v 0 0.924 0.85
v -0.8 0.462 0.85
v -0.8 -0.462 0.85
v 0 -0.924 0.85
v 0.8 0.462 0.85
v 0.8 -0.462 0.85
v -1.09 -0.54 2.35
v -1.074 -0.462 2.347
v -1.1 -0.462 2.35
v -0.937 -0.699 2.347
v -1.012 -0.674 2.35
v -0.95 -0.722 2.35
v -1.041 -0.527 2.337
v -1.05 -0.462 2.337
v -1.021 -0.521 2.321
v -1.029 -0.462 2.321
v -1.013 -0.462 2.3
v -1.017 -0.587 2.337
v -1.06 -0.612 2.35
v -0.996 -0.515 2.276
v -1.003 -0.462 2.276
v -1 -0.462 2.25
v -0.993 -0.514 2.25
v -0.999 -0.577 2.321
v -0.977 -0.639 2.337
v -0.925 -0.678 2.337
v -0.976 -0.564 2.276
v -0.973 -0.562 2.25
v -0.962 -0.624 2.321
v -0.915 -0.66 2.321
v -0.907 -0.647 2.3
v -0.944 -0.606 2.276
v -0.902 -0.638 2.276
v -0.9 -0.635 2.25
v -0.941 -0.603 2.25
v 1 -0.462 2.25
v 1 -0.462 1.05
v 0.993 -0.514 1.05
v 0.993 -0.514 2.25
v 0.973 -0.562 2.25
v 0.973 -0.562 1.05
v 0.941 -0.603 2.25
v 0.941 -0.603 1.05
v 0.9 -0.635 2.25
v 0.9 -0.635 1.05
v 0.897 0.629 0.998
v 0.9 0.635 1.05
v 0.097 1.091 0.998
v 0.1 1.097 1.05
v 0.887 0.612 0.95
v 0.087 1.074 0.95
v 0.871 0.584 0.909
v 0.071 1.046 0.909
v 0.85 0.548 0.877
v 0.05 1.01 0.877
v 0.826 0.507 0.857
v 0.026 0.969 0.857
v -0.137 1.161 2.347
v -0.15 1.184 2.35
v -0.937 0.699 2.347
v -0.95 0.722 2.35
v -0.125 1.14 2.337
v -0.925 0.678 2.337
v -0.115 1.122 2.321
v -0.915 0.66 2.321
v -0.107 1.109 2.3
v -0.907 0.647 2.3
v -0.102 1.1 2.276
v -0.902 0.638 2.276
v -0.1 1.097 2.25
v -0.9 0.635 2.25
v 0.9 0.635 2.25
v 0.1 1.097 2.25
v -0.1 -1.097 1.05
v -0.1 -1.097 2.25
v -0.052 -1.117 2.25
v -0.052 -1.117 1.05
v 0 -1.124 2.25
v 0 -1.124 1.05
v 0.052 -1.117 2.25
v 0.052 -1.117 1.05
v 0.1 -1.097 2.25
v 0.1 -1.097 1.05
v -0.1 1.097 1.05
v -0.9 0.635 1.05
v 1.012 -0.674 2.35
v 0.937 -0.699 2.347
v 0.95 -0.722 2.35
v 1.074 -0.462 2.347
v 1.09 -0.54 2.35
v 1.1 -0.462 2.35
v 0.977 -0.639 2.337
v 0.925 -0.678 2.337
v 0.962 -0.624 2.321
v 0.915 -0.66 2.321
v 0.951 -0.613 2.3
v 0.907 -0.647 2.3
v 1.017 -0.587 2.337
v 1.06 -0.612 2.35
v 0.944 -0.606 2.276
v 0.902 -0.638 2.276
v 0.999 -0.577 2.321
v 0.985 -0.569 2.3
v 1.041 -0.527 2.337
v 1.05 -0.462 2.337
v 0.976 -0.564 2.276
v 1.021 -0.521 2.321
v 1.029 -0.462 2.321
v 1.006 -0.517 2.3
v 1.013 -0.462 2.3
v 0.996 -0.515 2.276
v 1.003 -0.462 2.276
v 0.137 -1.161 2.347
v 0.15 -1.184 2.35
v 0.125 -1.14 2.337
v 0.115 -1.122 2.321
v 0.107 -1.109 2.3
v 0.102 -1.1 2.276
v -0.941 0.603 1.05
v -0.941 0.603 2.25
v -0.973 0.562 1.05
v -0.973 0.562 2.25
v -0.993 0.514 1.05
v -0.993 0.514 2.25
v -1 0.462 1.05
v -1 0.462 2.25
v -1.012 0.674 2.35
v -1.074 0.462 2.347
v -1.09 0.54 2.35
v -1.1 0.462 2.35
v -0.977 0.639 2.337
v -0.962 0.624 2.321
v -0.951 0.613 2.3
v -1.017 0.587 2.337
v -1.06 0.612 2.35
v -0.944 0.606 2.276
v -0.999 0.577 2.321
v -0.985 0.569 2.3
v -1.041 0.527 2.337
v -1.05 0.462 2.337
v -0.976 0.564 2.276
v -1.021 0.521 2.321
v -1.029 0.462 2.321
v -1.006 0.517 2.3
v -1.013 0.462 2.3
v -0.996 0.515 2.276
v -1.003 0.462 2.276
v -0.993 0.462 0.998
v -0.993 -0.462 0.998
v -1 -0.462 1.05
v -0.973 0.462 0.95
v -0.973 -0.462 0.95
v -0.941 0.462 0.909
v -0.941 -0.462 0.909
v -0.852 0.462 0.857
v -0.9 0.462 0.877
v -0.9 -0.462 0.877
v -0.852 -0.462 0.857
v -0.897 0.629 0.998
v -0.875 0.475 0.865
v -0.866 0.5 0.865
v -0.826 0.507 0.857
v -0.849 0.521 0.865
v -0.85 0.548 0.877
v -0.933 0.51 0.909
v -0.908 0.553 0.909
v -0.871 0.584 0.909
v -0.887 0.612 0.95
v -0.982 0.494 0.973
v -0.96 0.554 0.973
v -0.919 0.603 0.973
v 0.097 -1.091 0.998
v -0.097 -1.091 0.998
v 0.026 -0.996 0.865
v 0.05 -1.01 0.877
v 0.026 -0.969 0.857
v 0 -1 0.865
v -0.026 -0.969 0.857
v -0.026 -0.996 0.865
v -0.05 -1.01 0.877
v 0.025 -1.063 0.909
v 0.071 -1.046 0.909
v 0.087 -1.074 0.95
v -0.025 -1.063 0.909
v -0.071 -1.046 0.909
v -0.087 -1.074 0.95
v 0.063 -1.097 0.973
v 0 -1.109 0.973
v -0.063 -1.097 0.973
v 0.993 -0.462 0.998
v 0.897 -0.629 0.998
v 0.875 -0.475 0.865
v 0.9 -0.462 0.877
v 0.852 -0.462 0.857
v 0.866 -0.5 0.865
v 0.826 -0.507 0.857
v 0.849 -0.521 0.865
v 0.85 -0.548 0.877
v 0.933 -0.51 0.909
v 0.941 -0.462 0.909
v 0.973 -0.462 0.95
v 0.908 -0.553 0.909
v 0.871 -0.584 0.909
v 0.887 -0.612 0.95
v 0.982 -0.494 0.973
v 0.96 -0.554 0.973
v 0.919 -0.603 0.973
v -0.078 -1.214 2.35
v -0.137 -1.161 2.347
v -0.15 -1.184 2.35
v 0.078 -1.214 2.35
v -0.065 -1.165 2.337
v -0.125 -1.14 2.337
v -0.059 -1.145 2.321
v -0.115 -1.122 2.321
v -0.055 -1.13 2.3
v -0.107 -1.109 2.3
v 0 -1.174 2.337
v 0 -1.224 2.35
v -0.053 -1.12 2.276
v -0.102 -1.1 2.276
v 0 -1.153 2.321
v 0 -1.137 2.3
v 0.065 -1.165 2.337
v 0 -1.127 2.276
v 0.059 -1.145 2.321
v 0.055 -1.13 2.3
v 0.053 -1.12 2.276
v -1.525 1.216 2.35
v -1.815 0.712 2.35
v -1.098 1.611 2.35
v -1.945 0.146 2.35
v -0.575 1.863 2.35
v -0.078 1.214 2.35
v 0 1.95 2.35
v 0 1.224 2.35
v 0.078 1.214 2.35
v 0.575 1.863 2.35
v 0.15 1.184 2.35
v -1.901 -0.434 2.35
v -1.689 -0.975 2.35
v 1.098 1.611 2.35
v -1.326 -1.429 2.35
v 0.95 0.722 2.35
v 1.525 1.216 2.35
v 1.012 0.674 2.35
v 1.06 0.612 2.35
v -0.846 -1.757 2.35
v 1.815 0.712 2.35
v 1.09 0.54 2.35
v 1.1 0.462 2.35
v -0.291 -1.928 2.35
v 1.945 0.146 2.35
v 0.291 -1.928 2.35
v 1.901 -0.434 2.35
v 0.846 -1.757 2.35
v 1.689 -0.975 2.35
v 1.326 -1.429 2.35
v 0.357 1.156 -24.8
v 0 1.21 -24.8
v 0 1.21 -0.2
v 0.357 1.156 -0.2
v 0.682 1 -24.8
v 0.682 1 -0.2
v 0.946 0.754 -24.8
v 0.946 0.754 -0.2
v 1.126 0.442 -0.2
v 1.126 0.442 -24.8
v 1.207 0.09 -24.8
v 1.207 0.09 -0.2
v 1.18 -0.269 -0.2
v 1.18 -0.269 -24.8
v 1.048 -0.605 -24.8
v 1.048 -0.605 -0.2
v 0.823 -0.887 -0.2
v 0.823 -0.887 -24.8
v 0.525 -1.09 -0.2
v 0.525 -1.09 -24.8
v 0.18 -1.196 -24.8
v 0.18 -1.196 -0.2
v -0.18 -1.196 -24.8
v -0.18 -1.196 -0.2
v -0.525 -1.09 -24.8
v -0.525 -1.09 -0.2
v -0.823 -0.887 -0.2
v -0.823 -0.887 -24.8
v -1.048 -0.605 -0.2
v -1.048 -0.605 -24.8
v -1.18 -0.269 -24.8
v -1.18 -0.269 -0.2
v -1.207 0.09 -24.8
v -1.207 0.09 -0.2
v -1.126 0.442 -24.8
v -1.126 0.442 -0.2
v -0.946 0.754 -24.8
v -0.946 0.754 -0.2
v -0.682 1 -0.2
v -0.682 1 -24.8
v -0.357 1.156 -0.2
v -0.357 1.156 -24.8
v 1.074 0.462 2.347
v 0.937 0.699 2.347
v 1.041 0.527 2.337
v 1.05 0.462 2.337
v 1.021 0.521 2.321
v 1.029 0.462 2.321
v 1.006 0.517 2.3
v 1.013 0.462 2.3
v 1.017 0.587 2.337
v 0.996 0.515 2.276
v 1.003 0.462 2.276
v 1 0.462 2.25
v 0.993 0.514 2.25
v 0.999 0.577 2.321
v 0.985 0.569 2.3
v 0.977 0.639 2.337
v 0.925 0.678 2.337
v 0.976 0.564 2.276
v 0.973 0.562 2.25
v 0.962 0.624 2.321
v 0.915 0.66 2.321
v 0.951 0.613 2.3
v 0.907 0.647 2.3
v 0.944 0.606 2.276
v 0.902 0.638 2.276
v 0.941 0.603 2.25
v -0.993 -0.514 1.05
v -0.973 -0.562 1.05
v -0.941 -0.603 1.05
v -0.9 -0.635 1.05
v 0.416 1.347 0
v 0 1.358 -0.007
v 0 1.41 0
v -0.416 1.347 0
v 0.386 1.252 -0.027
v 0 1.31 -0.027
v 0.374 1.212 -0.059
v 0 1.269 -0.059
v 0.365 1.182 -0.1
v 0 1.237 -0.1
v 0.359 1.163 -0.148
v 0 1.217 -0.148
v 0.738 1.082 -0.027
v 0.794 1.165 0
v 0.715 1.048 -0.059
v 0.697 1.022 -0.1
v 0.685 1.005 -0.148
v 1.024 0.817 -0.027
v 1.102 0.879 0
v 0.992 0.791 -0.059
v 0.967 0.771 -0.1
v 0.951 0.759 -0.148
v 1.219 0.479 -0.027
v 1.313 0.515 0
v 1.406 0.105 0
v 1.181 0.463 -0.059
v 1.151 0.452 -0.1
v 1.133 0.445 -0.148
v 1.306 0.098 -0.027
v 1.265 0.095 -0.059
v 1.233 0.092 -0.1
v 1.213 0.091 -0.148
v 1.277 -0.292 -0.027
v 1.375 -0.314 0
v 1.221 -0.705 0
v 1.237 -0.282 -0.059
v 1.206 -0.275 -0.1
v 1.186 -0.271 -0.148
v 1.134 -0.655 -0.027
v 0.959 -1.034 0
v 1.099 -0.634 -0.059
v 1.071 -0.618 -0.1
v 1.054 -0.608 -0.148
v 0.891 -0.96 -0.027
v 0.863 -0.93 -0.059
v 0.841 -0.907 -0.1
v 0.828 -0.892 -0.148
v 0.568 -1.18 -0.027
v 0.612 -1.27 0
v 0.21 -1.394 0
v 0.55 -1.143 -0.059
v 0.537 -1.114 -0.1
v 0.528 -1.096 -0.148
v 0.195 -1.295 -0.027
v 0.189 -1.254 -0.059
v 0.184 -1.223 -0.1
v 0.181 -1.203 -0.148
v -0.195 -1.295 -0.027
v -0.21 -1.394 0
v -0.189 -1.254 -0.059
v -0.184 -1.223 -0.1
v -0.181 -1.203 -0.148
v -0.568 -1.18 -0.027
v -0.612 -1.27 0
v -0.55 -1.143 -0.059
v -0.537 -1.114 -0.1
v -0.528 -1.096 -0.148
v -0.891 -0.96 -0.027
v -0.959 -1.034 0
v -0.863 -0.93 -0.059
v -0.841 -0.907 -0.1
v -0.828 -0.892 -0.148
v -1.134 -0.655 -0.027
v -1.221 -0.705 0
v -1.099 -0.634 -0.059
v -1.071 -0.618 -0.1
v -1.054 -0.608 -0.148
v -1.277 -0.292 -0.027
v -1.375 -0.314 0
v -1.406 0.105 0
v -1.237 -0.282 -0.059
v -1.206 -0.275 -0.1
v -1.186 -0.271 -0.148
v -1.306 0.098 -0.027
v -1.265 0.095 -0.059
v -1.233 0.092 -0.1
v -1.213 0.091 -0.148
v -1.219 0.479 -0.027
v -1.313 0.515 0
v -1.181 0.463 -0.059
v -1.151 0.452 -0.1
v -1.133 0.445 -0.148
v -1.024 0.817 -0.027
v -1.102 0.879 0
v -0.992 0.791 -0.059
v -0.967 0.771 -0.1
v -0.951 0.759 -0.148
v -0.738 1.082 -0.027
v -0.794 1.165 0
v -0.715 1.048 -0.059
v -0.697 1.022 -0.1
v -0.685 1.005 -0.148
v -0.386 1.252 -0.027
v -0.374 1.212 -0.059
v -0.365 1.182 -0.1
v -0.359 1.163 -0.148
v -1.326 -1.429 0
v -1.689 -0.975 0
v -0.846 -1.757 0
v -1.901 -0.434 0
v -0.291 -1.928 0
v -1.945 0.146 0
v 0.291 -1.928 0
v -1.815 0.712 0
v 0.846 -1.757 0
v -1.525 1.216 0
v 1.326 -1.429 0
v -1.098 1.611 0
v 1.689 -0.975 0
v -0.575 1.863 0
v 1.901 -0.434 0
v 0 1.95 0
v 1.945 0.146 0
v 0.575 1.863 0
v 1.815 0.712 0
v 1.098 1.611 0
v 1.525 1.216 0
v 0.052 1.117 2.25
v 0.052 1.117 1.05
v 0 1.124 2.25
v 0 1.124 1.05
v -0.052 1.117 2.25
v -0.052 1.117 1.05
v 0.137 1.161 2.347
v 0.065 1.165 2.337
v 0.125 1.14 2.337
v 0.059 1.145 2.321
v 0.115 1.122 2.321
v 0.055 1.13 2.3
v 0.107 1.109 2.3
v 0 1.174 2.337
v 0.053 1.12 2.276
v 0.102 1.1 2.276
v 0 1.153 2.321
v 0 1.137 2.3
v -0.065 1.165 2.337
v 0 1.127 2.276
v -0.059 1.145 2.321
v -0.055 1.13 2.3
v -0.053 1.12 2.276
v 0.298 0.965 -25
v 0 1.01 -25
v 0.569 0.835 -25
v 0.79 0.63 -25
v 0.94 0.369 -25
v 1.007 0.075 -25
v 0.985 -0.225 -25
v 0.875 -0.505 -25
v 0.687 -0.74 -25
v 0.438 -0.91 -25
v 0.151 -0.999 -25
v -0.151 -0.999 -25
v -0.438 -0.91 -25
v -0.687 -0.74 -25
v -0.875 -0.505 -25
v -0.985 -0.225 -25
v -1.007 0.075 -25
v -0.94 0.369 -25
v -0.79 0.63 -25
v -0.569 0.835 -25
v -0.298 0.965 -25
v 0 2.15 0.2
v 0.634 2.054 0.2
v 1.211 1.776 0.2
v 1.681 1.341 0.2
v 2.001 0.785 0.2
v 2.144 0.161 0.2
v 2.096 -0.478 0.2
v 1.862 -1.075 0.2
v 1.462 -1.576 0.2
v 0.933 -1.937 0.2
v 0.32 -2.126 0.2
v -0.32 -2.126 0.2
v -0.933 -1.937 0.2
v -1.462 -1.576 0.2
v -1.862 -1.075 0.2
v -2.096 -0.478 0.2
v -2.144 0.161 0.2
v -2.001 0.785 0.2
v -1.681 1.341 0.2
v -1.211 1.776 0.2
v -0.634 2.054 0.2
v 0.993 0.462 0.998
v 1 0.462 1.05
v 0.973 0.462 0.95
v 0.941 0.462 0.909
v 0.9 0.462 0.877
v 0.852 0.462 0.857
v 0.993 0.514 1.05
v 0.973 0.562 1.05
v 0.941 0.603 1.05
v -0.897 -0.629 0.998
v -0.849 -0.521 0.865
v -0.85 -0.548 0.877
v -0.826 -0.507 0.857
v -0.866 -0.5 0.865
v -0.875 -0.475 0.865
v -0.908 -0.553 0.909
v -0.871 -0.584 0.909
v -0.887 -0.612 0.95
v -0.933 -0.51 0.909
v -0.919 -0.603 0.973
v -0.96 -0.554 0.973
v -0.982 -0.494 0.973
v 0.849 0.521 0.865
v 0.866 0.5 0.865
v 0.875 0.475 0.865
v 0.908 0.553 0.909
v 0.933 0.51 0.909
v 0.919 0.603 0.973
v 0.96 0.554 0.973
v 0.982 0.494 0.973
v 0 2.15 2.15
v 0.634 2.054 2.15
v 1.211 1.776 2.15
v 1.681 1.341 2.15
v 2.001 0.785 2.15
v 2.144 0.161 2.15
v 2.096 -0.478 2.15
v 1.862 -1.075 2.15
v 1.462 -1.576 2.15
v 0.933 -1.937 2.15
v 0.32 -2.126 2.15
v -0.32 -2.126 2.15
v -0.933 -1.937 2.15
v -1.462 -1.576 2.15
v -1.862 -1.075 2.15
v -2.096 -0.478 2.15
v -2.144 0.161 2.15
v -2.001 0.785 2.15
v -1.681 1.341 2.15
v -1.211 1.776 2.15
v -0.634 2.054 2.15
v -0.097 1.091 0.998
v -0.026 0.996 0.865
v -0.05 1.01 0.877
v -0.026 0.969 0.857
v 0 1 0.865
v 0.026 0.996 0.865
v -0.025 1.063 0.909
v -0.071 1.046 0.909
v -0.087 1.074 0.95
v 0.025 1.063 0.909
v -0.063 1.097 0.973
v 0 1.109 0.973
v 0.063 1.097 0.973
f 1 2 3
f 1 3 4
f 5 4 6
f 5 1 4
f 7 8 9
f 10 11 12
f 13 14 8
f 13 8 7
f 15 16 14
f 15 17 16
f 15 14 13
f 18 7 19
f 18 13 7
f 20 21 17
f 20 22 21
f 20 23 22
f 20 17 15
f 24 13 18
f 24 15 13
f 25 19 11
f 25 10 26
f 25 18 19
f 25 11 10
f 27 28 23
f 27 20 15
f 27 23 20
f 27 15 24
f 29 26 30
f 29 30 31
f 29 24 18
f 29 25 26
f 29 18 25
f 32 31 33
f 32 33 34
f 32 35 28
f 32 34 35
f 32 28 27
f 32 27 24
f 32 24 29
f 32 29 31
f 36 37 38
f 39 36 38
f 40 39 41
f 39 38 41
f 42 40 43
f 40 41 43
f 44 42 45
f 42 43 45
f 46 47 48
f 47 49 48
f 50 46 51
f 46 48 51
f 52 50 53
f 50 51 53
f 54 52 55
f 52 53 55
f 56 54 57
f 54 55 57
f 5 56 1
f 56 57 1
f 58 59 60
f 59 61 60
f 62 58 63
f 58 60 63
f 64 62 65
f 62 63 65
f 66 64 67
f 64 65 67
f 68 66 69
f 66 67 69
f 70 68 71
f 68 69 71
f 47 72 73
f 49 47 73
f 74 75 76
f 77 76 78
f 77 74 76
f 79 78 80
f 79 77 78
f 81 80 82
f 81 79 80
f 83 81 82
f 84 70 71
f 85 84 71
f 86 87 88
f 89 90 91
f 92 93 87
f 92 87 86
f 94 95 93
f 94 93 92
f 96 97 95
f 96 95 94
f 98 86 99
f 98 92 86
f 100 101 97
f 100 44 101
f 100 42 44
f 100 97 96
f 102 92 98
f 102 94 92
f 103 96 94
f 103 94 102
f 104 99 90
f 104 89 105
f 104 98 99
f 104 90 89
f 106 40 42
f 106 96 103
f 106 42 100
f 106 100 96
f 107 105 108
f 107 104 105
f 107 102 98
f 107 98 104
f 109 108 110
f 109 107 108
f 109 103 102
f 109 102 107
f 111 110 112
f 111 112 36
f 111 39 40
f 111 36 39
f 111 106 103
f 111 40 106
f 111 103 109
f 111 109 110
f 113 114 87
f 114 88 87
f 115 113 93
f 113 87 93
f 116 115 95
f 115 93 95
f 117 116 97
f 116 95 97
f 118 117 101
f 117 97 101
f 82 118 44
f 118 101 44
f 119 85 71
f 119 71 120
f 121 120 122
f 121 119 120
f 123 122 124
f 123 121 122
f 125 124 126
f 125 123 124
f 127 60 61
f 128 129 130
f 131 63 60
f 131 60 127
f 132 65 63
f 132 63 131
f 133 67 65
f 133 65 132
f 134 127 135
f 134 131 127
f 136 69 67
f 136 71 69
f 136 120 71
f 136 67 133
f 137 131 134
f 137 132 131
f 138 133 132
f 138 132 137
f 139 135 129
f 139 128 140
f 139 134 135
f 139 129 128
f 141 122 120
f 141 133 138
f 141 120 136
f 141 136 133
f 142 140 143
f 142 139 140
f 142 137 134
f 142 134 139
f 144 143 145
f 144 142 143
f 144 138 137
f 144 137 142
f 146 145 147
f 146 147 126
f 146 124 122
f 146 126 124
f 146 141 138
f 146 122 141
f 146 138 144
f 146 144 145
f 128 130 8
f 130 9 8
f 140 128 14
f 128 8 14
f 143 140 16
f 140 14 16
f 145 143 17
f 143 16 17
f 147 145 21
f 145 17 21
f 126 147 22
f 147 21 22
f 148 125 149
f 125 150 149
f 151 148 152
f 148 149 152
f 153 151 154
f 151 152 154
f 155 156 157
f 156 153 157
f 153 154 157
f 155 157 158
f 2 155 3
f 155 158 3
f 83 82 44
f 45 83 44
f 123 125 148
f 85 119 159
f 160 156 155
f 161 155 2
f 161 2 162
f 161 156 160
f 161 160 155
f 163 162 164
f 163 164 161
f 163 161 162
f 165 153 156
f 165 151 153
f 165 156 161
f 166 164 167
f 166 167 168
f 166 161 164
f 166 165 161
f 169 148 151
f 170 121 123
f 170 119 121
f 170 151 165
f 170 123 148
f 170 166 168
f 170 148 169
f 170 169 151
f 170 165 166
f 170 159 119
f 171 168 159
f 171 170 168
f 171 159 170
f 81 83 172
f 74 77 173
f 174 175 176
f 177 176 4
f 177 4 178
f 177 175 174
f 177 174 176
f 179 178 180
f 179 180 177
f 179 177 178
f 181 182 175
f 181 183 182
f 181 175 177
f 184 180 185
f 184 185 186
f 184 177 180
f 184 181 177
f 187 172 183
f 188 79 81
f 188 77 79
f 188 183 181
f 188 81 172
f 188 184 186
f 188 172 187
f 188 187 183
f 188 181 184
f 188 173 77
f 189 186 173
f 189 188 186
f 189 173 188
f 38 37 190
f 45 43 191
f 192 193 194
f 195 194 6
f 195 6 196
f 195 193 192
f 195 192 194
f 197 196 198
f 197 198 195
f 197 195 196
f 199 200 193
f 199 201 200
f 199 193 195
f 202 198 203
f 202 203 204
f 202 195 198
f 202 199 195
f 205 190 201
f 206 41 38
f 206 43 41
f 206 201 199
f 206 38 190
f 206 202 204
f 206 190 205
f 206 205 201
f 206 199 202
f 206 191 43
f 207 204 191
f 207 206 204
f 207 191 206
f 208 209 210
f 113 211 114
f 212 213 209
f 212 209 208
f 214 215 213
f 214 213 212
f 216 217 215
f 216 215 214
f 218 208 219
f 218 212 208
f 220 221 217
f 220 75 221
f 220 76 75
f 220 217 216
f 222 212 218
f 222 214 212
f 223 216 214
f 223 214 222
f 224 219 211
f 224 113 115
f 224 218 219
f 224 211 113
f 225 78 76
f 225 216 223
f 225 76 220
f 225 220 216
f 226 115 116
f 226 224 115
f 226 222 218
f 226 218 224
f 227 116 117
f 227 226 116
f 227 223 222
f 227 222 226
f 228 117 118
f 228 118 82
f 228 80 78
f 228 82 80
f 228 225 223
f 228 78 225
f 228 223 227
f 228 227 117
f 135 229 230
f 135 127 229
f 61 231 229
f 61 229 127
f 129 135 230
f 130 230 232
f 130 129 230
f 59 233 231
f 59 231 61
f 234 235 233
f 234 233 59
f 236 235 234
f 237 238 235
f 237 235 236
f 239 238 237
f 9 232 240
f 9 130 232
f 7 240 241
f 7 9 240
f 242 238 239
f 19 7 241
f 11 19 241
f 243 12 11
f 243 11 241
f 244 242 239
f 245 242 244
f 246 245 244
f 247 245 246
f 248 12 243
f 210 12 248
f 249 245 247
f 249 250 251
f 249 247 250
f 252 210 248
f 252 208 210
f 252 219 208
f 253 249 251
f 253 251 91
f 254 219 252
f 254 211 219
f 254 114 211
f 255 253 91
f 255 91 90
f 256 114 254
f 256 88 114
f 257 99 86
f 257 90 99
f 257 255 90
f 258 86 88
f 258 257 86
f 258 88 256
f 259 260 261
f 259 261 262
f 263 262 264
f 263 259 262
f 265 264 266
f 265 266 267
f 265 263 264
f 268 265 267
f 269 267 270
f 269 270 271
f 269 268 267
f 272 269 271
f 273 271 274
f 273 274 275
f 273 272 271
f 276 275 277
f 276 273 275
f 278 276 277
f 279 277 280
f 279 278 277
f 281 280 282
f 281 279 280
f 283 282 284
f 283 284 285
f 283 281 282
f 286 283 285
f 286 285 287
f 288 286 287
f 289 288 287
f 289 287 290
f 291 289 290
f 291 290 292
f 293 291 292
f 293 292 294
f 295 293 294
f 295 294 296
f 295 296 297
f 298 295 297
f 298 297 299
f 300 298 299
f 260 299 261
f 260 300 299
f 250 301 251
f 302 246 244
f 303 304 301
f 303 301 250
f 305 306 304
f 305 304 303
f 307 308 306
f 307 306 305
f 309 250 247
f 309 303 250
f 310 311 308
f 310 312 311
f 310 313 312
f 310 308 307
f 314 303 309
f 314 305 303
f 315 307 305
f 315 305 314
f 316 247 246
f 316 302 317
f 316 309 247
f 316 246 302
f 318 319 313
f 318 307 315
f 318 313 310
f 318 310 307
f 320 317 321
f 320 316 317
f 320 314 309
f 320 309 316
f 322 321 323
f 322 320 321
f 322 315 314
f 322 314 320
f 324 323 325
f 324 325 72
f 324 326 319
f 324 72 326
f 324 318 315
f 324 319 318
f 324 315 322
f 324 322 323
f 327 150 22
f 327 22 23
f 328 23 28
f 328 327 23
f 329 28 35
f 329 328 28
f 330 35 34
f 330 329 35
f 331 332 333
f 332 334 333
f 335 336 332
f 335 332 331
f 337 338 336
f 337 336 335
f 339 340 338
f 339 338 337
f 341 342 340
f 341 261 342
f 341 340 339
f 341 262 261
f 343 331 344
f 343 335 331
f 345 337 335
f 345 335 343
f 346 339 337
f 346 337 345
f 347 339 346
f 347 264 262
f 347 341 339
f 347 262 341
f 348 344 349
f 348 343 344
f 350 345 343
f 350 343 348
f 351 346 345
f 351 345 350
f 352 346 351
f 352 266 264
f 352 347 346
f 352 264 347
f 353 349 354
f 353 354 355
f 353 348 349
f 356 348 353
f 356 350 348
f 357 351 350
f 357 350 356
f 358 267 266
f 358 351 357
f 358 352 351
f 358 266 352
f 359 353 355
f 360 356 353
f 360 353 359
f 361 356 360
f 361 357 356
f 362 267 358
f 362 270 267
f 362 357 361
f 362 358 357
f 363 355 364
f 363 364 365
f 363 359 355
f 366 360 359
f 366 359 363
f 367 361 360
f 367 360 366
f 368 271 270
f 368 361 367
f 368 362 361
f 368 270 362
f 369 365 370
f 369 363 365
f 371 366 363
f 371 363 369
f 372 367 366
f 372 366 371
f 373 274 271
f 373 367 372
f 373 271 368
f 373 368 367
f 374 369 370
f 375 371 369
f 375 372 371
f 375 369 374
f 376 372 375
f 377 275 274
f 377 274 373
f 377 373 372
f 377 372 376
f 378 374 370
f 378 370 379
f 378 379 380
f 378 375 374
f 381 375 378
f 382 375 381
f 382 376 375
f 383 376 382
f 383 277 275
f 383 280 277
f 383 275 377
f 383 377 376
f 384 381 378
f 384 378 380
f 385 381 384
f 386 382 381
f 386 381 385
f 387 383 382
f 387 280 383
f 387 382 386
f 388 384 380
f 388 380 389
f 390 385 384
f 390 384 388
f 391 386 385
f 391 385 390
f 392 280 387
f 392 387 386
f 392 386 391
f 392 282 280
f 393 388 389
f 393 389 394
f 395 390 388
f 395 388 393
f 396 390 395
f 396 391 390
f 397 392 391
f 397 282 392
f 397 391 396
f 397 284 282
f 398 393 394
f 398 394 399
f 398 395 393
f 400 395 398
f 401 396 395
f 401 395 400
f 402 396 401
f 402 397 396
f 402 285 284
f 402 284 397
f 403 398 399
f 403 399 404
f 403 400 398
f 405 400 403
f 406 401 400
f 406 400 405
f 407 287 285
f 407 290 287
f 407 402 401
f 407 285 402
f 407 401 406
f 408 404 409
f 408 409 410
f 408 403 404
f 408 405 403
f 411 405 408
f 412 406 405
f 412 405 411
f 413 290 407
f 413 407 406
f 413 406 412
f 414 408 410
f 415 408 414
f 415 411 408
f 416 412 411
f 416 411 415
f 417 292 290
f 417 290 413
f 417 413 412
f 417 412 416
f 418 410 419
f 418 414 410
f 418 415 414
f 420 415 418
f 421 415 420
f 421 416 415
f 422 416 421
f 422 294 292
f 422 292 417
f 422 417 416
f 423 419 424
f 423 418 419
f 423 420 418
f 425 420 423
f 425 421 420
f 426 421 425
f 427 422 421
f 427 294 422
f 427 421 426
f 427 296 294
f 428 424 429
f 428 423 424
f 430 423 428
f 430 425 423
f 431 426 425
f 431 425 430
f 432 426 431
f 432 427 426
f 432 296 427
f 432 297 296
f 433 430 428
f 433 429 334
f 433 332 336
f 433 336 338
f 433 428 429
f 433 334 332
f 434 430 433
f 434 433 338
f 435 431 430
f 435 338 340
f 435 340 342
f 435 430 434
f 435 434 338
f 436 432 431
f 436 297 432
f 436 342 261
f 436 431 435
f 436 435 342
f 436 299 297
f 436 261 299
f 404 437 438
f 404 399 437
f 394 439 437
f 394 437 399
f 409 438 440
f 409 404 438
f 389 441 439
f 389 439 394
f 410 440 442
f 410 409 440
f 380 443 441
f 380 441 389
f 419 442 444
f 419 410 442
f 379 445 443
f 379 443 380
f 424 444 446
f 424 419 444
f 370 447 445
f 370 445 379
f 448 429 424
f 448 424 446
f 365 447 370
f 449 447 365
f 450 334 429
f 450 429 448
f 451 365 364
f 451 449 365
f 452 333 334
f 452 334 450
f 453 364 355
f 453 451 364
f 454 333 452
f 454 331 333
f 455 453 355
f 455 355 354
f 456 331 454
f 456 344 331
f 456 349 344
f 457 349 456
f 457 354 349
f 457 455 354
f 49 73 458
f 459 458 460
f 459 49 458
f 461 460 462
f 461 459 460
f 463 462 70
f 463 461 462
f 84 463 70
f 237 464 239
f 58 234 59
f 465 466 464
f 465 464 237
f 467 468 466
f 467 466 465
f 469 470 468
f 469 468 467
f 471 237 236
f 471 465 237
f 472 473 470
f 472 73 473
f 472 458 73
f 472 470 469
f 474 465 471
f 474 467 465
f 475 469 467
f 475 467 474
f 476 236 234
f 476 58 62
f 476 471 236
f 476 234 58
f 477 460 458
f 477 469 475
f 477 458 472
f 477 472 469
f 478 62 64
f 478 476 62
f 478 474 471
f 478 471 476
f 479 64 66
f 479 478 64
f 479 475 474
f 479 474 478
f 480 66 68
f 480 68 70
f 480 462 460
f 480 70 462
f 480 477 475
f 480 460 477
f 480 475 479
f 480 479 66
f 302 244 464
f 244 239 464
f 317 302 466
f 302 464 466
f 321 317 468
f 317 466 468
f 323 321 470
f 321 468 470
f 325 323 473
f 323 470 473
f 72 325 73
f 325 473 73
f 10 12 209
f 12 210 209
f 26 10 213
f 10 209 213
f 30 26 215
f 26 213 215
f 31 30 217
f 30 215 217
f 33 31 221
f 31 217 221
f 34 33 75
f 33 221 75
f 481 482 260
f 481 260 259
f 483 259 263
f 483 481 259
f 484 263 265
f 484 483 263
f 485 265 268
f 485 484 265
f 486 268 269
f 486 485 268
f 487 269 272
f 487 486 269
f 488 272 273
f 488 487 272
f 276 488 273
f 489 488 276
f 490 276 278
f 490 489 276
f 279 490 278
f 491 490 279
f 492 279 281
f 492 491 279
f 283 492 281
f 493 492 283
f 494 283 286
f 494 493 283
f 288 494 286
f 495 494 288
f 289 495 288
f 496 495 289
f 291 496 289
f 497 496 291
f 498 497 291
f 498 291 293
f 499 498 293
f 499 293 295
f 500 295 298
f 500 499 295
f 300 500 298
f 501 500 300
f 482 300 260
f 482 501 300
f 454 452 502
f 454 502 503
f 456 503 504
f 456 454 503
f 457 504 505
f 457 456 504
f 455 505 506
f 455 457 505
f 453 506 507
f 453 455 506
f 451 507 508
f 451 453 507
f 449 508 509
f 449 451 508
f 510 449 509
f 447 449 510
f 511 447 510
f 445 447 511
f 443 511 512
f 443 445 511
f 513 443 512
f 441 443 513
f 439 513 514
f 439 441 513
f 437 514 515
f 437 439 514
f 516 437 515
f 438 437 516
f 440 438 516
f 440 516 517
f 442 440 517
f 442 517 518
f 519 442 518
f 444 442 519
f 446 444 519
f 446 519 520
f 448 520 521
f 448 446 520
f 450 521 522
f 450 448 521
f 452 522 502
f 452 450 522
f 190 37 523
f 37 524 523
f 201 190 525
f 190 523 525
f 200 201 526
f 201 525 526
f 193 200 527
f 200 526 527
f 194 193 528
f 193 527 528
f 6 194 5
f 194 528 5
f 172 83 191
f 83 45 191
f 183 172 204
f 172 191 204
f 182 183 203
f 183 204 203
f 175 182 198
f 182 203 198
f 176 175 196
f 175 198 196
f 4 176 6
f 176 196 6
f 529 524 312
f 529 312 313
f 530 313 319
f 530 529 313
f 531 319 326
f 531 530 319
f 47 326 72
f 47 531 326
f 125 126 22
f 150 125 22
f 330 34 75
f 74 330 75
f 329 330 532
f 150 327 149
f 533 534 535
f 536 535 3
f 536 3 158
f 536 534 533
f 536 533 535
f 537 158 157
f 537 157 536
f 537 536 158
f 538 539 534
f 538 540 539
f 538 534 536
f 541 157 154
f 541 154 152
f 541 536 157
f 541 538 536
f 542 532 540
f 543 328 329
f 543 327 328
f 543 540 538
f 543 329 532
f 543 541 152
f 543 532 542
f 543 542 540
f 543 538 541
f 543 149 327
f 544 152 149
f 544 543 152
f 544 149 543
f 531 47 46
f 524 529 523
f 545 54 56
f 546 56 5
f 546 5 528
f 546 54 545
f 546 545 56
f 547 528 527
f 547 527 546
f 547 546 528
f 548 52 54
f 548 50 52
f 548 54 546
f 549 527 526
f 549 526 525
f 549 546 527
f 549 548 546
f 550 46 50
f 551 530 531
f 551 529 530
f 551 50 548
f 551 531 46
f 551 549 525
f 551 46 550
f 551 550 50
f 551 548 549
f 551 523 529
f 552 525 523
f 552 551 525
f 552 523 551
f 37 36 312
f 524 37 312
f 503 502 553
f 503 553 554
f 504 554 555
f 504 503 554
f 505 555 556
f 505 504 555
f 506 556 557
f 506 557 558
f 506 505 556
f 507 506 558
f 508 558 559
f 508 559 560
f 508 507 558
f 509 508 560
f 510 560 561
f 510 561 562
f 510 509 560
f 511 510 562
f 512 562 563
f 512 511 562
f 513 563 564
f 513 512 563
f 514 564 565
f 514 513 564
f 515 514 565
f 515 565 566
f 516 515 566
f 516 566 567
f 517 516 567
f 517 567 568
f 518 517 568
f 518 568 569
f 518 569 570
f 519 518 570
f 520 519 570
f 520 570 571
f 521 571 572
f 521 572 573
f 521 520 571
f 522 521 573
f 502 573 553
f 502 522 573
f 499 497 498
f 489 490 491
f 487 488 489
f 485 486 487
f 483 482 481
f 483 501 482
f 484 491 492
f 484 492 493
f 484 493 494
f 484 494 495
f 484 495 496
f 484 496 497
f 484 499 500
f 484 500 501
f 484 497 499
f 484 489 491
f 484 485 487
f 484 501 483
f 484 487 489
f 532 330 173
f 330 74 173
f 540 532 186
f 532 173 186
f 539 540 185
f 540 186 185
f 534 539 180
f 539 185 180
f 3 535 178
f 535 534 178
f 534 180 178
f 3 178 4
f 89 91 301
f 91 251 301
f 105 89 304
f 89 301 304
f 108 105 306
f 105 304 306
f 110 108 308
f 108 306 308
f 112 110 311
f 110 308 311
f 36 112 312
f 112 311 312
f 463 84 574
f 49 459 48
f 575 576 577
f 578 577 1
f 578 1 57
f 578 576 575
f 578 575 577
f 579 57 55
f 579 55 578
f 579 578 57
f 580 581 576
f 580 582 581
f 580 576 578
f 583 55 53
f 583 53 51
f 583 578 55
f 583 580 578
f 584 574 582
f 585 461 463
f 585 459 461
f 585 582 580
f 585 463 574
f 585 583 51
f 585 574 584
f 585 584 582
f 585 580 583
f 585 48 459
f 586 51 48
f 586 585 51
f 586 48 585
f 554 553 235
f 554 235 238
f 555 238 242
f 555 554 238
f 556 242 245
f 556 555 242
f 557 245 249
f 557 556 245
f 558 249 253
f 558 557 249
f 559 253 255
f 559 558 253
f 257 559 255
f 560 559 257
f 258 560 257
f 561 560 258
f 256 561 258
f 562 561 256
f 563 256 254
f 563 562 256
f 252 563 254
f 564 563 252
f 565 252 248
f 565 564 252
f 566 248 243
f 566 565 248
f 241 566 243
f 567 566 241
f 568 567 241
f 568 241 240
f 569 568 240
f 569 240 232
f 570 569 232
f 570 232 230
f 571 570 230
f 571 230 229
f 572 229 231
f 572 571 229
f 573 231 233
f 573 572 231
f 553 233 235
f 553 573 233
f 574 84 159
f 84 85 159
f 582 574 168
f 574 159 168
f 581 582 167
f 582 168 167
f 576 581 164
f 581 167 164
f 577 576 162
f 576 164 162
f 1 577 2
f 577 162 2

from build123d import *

# Parameters (mm, degrees)
SCHNITT_LINEAR_AUSTRAGEN1_DEPTH = 1.5
FASE1_SIZE                      = 0.2
VERRUNDUNG1_R                   = 0.2
VERRUNDUNG2_R                   = 0.1


with BuildPart() as part:
    # Skizze1 → Rotation1 (revolve)
    with BuildSketch(Plane(origin=(0, 0, 0), x_dir=(0, 0, -1), z_dir=(1, 0, 0))):
        Polygon((-2.35, 0), (-2.35, 2.15), (0, 2.15), (0, 1.21), (25, 1.21), (25, 0), align=None)
    revolve(axis=Axis((0, 0, 21.919879518), (0, 0, -1)))

    # Skizze2 → Schnitt-Linear austragen1 (cut)
    with BuildSketch(Plane.XY.offset(2.35)):
        Polygon((1, -0.577350269), (1, 0.577350269), (0, 1.154700538), (-1, 0.577350269), (-1, -0.577350269), (0, -1.154700538), align=None)
    extrude(amount=-SCHNITT_LINEAR_AUSTRAGEN1_DEPTH, mode=Mode.SUBTRACT)

    # Fase1
    fase1_edges = [part.edges().sort_by_distance(p)[0] for p in [
        (0, -1.21, -25),
        (0, -2.15, 0),
        (0, -2.15, 2.35),
    ]]
    chamfer(fase1_edges, length=FASE1_SIZE)

    # Verrundung1
    verrundung1_edges = [part.edges().sort_by_distance(p)[0] for p in [
        (0.5, -0.866025404, 0.85),
        (1, -0.577350269, 1.6),
        (-0.5, -0.866025404, 0.85),
        (0, -1.154700538, 1.6),
        (-1, 0, 0.85),
        (-1, -0.577350269, 1.6),
        (-0.5, 0.866025404, 0.85),
        (-1, 0.577350269, 1.6),
        (0.5, 0.866025404, 0.85),
        (0, 1.154700538, 1.6),
        (1, 0, 0.85),
        (1, 0.577350269, 1.6),
        (0, -1.21, 0),
    ]]
    fillet(verrundung1_edges, radius=VERRUNDUNG1_R)

    # Verrundung2
    verrundung2_edges = [part.edges().sort_by_distance(p)[0] for p in [
        (-0.5, -0.866025404, 2.35),
        (-1, 0, 2.35),
        (-0.5, 0.866025404, 2.35),
        (0.5, 0.866025404, 2.35),
        (1, 0, 2.35),
        (0.5, -0.866025404, 2.35),
        (-0.973205081, -0.561880215, 2.35),
        (0, -1.123760431, 2.35),
        (0.973205081, -0.561880215, 2.35),
        (0.973205081, 0.561880215, 2.35),
        (0, 1.123760431, 2.35),
        (-0.973205081, 0.561880215, 2.35),
    ]]
    fillet(verrundung2_edges, radius=VERRUNDUNG2_R)


solid = part.part
